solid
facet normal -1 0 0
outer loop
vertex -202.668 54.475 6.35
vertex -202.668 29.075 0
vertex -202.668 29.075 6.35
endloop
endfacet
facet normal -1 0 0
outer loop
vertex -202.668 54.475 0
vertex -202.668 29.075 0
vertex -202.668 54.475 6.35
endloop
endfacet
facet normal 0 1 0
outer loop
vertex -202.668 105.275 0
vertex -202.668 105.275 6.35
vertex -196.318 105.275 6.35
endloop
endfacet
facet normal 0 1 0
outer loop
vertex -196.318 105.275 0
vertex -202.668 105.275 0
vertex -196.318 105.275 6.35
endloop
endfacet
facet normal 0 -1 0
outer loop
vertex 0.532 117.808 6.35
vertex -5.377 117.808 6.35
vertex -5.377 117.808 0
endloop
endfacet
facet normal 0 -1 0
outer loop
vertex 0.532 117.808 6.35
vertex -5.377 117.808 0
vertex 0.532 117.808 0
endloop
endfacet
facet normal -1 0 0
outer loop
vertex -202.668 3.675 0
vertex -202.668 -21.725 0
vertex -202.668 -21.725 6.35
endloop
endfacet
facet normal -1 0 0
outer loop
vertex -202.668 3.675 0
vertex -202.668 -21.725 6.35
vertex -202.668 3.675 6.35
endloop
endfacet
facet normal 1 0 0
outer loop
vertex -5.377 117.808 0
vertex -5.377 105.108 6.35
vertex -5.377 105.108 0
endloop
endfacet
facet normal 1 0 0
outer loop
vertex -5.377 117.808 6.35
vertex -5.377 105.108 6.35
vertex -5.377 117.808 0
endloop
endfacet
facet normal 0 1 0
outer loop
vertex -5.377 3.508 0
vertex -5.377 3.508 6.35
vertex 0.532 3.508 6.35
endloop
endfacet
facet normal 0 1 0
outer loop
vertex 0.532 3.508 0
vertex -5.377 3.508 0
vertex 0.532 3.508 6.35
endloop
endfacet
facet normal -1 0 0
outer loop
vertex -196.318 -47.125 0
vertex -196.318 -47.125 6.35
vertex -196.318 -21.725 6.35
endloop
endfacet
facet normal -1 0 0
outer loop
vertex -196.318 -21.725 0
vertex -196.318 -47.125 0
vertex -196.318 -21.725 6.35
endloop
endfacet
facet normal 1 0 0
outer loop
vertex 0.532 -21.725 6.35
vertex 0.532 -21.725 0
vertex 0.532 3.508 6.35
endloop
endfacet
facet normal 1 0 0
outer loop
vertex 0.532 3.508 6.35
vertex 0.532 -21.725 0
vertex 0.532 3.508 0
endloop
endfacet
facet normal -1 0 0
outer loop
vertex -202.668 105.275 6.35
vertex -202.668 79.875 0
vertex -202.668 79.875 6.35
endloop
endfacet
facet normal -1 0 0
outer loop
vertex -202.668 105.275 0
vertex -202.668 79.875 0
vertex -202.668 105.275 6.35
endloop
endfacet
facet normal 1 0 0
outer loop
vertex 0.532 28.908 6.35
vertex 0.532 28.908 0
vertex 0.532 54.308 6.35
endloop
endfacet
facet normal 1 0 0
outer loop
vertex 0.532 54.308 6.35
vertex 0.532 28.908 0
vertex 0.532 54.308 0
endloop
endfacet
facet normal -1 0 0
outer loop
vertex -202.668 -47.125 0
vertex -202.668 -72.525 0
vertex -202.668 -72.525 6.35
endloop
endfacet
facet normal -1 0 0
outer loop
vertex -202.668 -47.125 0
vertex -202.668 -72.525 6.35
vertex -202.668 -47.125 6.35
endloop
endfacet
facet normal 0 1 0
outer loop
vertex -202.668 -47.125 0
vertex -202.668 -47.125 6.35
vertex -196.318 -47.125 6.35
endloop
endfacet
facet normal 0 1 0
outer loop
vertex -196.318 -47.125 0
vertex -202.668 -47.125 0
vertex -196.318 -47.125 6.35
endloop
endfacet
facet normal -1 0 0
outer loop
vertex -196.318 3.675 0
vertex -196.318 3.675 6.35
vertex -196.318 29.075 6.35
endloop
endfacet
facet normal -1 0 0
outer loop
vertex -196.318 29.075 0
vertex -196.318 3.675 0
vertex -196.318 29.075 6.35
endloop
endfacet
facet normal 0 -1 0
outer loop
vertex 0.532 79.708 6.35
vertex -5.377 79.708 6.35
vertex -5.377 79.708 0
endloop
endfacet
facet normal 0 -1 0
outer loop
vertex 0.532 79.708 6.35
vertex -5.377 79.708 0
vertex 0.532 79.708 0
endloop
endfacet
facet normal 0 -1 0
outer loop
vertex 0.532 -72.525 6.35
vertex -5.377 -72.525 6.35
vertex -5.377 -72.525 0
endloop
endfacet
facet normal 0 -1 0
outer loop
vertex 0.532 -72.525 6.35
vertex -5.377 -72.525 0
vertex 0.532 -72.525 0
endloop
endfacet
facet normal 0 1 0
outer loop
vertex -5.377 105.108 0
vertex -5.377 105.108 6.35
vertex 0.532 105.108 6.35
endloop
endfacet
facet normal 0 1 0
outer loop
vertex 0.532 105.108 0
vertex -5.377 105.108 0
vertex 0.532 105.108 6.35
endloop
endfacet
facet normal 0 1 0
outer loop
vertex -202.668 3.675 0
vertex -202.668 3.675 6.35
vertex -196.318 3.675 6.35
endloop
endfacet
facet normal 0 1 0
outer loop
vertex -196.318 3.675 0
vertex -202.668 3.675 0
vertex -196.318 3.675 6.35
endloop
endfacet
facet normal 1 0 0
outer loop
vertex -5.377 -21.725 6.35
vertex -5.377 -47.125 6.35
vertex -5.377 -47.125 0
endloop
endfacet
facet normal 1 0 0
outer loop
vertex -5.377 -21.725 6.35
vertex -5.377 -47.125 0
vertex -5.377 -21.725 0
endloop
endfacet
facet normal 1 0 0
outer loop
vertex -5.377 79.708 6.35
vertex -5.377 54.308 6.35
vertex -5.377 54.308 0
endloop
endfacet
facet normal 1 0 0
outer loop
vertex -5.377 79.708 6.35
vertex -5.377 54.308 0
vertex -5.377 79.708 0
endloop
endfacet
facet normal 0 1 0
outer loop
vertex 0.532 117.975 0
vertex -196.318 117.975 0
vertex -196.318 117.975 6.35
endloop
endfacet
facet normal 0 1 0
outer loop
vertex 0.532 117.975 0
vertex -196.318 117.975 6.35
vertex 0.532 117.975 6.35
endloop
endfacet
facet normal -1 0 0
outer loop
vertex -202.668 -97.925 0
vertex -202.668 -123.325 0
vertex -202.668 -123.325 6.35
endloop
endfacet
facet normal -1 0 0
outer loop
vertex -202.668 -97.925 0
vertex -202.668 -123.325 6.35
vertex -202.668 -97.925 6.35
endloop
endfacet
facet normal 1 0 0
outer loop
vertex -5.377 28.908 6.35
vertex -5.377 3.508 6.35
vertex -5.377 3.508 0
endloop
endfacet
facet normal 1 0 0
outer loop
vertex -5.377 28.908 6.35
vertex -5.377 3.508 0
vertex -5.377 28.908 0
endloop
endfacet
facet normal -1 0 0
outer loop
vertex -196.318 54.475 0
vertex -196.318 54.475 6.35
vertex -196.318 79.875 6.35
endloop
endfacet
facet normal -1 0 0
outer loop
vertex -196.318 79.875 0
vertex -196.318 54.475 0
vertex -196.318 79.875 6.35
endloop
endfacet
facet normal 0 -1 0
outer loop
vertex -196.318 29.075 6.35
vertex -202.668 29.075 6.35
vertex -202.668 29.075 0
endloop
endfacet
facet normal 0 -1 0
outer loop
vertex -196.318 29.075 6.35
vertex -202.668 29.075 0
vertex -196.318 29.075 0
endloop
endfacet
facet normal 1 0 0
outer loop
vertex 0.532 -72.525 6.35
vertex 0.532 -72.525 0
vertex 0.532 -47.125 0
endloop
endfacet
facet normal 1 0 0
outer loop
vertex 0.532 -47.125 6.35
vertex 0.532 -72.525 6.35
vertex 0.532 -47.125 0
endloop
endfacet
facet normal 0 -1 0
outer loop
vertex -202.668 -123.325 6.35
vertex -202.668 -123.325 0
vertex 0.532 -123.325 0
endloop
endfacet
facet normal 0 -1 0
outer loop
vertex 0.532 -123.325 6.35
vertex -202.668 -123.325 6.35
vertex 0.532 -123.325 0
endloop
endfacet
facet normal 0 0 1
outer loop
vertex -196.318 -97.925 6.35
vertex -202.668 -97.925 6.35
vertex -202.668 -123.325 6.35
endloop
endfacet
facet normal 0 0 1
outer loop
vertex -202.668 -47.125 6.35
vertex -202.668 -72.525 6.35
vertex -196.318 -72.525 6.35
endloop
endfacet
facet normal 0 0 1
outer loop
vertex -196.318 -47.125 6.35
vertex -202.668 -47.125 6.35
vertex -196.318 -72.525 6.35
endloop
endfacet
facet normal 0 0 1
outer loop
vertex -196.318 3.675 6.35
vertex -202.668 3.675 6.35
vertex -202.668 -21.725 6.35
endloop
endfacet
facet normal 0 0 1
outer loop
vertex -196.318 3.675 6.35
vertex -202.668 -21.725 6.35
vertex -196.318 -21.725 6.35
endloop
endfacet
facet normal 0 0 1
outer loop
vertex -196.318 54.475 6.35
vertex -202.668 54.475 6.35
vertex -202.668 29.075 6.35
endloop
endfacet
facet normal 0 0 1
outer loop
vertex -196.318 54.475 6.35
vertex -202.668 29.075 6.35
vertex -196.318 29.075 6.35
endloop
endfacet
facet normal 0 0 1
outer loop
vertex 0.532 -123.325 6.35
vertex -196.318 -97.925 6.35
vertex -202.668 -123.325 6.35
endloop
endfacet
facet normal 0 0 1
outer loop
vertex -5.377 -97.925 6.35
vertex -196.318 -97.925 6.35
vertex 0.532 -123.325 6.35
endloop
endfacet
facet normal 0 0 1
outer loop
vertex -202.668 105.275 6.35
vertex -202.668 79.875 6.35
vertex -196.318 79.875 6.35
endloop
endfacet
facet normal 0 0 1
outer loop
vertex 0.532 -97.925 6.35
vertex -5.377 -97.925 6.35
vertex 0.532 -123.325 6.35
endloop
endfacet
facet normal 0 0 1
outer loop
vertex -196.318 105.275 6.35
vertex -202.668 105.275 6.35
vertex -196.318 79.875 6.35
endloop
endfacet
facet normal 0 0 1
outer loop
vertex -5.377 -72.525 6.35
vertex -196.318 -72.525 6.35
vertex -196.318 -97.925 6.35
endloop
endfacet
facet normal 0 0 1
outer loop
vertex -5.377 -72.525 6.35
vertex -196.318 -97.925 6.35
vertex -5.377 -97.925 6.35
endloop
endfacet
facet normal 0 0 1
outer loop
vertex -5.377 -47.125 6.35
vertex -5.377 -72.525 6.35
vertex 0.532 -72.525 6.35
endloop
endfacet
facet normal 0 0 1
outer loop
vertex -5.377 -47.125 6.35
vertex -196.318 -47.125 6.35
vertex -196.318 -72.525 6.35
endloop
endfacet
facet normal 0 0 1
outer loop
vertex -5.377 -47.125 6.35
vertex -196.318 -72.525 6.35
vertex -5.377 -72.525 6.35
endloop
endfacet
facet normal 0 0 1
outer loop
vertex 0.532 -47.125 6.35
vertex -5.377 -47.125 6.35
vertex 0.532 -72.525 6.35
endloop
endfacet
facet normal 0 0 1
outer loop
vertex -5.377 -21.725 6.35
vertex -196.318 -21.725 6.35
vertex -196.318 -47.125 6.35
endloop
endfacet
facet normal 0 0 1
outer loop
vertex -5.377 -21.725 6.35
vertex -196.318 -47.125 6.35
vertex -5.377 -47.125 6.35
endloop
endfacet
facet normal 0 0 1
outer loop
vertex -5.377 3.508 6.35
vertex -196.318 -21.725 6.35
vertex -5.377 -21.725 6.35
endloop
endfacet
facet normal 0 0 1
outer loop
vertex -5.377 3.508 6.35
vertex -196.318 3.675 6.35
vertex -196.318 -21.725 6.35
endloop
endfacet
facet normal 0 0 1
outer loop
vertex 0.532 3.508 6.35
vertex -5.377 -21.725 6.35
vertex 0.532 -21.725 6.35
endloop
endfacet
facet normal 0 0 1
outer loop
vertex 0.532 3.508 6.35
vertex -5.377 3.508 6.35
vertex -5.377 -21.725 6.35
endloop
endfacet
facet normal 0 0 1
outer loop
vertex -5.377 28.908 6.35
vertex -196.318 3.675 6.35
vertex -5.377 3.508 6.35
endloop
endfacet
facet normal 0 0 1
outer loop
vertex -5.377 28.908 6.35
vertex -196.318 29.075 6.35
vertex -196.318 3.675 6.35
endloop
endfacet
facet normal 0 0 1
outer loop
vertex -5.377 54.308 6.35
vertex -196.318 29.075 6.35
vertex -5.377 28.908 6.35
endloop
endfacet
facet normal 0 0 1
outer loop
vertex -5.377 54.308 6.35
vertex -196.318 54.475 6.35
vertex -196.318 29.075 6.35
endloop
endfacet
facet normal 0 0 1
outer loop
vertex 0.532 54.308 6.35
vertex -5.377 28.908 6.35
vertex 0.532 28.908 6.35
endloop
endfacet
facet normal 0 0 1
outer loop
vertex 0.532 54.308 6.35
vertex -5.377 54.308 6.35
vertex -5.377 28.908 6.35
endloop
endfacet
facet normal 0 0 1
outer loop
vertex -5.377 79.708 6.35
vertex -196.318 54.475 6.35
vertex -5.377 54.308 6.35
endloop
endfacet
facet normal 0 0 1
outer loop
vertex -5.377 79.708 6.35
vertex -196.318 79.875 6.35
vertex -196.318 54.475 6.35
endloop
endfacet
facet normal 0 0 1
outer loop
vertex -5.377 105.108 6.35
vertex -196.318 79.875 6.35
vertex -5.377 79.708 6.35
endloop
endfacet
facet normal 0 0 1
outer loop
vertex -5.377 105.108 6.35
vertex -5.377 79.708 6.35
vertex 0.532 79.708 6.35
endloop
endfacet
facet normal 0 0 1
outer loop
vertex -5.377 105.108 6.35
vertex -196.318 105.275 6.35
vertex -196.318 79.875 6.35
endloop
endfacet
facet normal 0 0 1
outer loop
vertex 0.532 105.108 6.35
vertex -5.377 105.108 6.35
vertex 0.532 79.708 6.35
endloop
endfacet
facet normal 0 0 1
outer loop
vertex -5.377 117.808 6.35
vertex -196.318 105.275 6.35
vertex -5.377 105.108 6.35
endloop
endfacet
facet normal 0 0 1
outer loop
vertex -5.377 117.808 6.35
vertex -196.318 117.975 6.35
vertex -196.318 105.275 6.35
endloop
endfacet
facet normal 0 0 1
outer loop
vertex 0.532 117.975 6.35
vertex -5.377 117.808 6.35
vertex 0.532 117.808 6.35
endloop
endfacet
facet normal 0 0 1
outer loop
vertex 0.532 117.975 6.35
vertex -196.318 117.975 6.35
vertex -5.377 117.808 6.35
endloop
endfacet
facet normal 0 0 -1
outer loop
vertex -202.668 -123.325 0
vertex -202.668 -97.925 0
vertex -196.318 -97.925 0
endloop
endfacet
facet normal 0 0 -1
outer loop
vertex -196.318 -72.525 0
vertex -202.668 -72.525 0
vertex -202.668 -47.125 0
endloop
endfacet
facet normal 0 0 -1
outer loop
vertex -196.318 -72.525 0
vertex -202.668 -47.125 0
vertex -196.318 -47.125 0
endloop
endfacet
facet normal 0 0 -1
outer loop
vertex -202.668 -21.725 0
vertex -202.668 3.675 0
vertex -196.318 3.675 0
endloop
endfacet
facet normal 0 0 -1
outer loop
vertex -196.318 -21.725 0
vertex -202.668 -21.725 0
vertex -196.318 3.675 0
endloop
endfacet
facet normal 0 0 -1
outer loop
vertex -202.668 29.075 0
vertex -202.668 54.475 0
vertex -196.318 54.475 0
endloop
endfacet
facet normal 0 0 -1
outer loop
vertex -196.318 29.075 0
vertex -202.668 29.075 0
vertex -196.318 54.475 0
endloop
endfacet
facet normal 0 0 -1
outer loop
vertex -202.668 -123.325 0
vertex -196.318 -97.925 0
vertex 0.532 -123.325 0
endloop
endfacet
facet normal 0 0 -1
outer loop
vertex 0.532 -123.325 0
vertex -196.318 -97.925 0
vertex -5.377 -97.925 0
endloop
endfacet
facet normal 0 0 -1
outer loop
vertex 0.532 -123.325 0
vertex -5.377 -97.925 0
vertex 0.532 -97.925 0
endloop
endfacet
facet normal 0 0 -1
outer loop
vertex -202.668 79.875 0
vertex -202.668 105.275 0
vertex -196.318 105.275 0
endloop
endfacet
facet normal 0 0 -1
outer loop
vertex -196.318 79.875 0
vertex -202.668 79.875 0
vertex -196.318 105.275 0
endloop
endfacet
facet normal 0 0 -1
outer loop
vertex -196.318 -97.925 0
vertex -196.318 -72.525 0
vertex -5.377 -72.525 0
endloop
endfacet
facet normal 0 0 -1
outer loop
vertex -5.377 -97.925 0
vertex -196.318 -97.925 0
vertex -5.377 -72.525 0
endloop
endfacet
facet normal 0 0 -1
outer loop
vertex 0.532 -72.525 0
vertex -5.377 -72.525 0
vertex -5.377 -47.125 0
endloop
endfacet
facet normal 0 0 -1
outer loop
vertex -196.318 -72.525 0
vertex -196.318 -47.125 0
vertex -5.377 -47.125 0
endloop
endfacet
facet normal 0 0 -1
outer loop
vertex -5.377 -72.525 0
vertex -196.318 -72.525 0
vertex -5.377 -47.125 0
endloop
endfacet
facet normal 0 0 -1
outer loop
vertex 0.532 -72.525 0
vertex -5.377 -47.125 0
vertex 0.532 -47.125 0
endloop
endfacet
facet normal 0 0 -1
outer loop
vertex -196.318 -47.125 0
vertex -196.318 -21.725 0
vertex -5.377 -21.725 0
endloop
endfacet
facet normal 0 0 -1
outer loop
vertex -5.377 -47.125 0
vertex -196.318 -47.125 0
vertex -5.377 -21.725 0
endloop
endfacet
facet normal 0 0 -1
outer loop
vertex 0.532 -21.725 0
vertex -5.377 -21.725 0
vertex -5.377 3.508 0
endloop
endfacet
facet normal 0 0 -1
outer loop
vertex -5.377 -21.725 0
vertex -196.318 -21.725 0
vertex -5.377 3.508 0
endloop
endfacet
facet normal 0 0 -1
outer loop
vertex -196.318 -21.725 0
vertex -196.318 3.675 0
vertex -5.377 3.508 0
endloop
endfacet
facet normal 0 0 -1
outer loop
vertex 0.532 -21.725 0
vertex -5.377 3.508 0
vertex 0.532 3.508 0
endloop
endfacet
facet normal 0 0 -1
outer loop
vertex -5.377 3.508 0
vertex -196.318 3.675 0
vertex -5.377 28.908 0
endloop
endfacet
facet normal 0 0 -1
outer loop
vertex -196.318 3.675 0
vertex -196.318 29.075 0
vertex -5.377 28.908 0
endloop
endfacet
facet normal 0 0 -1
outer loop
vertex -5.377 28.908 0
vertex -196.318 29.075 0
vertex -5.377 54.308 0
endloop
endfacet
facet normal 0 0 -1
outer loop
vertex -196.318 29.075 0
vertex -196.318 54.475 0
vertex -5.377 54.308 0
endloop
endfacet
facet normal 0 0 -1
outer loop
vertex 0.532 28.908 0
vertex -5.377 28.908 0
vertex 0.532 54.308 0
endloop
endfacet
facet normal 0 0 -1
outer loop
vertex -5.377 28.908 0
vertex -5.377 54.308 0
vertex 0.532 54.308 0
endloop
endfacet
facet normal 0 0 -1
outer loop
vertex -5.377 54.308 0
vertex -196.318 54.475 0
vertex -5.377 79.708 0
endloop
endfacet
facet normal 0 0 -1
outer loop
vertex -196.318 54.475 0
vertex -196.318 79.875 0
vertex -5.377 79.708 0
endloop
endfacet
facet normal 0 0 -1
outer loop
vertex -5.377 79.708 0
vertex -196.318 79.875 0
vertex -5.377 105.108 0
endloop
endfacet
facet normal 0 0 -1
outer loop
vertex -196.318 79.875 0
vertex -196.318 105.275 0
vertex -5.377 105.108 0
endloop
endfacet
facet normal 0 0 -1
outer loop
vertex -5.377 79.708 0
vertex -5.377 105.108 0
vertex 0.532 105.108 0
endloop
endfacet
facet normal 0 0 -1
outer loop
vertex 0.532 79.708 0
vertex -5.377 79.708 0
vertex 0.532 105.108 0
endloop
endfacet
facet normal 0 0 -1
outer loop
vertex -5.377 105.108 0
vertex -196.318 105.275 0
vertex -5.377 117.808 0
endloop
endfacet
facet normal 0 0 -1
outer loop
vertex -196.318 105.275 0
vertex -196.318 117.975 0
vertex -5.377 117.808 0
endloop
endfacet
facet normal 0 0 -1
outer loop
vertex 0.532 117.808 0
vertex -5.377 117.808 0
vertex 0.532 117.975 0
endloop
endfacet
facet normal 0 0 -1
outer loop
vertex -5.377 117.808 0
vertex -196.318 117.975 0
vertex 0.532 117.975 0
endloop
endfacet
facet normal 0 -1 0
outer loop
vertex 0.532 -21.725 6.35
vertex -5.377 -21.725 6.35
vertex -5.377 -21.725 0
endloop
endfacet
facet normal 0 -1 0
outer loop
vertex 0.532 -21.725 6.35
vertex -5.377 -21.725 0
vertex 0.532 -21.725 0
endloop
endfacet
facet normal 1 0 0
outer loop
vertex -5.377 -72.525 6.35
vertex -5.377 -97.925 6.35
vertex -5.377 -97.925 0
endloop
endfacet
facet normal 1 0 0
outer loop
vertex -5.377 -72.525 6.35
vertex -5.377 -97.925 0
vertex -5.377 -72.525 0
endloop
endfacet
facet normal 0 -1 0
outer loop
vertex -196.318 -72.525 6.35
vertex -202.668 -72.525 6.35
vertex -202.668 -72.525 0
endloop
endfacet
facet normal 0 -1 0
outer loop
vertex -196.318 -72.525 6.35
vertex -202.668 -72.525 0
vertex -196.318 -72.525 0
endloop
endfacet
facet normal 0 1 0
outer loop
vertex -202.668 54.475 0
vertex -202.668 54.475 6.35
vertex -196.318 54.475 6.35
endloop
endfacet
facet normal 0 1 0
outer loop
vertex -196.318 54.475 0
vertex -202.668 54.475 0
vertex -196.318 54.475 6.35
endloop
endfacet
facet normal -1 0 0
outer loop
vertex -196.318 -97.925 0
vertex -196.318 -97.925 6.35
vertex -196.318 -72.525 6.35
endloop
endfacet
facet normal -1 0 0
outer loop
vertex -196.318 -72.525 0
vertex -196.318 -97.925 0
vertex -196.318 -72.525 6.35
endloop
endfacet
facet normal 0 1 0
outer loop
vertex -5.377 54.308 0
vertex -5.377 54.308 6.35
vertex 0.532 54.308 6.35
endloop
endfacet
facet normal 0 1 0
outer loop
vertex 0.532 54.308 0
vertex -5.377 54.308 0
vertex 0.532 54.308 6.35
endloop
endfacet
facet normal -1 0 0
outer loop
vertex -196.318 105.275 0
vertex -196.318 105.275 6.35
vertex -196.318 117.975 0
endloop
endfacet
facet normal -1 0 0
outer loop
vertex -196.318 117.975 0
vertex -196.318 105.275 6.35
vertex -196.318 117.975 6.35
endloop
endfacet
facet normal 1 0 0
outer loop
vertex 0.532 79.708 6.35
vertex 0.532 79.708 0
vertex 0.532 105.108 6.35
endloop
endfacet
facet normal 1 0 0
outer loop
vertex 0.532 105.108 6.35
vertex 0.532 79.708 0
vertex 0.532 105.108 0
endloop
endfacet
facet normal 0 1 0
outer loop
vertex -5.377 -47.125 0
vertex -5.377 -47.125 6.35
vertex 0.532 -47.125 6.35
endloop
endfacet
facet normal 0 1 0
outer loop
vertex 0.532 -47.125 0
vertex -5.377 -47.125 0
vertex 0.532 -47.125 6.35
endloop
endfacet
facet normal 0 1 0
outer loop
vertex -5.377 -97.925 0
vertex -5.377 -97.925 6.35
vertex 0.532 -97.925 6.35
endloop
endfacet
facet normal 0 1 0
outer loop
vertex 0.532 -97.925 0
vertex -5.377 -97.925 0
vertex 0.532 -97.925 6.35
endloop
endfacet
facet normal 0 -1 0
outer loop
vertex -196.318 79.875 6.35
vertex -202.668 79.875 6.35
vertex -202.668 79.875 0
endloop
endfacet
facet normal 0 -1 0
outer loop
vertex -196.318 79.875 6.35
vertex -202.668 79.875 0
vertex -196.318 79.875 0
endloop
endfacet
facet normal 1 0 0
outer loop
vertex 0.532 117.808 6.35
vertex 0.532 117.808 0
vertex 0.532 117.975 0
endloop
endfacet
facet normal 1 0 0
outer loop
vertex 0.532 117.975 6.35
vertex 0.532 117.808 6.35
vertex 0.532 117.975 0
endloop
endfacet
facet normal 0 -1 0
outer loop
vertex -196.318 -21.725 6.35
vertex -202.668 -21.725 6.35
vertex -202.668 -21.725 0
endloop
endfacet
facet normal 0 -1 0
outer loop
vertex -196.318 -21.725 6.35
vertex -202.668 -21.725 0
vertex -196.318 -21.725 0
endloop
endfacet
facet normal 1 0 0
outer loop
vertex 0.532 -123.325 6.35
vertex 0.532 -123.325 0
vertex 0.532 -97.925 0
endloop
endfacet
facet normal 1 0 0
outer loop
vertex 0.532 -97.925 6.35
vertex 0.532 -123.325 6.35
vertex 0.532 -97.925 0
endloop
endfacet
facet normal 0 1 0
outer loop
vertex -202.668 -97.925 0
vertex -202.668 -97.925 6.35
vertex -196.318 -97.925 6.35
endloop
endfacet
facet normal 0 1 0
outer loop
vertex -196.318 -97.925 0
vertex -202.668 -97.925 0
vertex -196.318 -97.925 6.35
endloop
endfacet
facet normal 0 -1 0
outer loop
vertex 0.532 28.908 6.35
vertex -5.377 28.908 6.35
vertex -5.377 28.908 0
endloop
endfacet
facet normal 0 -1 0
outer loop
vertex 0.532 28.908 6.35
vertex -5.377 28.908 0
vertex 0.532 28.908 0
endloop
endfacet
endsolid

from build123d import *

# Parameters (mm, degrees)
SKETCH1_W           = 203.2
SKETCH1_H           = 241.3
BOSS_EXTRUDE1_DEPTH = 6.35
SKETCH2_W           = 6.35
SKETCH2_H           = 25.4
SKETCH2_H_2         = 12.7
CUT_EXTRUDE2_DEPTH  = 7.62


with BuildPart() as part:
    # Sketch1 → Boss-Extrude1 (new body)
    with BuildSketch(Plane.XY):
        with Locations((-101.068226601, -2.674507389)):
            Rectangle(SKETCH1_W, SKETCH1_H)
    extrude(amount=BOSS_EXTRUDE1_DEPTH)

    # Sketch2 → Cut-Extrude2 (cut)
    with BuildSketch(Plane.XY.offset(6.35)):
        with Locations((-199.493226601, -85.224507389)):
            Rectangle(SKETCH2_W, SKETCH2_H)
        with Locations((-199.493226601, -34.424507389)):
            Rectangle(SKETCH2_W, SKETCH2_H)
        with Locations((-199.493226601, 16.375492611)):
            Rectangle(SKETCH2_W, SKETCH2_H)
        with Locations((-199.493226601, 67.175492611)):
            Rectangle(SKETCH2_W, SKETCH2_H)
        with Locations((-199.493226601, 111.625492611)):
            Rectangle(SKETCH2_W, SKETCH2_H_2)
        with Locations((-2.202282379, -85.224507389)):
            Rectangle(SKETCH2_W, SKETCH2_H)
        with Locations((-2.202282379, -34.424507389)):
            Rectangle(SKETCH2_W, SKETCH2_H)
        with Locations((-2.202282379, 16.208154802)):
            Rectangle(SKETCH2_W, SKETCH2_H)
        with Locations((-2.202282379, 67.008154802)):
            Rectangle(SKETCH2_W, SKETCH2_H)
        with Locations((-2.202282379, 111.458154802)):
            Rectangle(SKETCH2_W, SKETCH2_H_2)
    extrude(amount=-CUT_EXTRUDE2_DEPTH, mode=Mode.SUBTRACT)


solid = part.part
